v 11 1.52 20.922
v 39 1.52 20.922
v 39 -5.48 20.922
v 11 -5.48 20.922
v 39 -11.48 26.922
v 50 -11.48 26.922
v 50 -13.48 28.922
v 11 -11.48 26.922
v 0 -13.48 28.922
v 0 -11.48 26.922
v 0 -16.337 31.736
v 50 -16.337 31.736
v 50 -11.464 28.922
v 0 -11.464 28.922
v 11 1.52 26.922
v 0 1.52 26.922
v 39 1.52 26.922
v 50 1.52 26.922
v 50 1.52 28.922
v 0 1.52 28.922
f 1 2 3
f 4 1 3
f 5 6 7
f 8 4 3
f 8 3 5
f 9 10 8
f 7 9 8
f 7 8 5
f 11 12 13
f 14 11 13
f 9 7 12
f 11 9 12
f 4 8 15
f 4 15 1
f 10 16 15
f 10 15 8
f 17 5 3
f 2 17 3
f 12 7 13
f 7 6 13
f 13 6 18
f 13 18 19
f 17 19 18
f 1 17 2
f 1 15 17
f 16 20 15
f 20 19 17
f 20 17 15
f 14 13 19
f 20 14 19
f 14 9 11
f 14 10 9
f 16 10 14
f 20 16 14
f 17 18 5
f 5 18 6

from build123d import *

# Parameters (mm, degrees)
BOSS_EXTRUDE1_DEPTH = 50
CUT_EXTRUDE1_DEPTH  = 11
BOSS_EXTRUDE2_DEPTH = 50


with BuildPart() as part:
    # Sketch1 → Boss-Extrude1 (new body)
    with BuildSketch(Plane(origin=(0, 0, 0), x_dir=(0, 0, -1), z_dir=(1, 0, 0))):
        Polygon((-28.922236088, -13.479594195), (-28.922236088, 1.520405805), (-20.922236088, 1.520405805), (-20.922236088, -5.479594195), align=None)
    extrude(amount=BOSS_EXTRUDE1_DEPTH)

    # Sketch2 → Cut-Extrude1 (cut)
    with BuildSketch(Plane(origin=(50, 0, 0), x_dir=(0, 0, -1), z_dir=(1, 0, 0))):
        Polygon((-20.922236088, 1.520405805), (-26.922236088, 1.520405805), (-26.922236088, -11.479594195), (-20.922236088, -5.479594195), align=None)
    cut_extrude1 = extrude(amount=-CUT_EXTRUDE1_DEPTH, mode=Mode.SUBTRACT)

    # Mirror1: Cut-Extrude1 across plane
    add(cut_extrude1.mirror(Plane(origin=(25, 0, 0), x_dir=(0, 0, 1), z_dir=(1, 0, 0))), mode=Mode.SUBTRACT)

    # Sketch3 → Boss-Extrude2 (add, through all)
    with BuildSketch(Plane(origin=(50, 0, 0), x_dir=(0, 0, -1), z_dir=(1, 0, 0))):
        Polygon((-28.922236088, -13.479594195), (-31.735625087, -16.337129199), (-28.922236088, -11.464196511), align=None)
    extrude(amount=-BOSS_EXTRUDE2_DEPTH)


solid = part.part
